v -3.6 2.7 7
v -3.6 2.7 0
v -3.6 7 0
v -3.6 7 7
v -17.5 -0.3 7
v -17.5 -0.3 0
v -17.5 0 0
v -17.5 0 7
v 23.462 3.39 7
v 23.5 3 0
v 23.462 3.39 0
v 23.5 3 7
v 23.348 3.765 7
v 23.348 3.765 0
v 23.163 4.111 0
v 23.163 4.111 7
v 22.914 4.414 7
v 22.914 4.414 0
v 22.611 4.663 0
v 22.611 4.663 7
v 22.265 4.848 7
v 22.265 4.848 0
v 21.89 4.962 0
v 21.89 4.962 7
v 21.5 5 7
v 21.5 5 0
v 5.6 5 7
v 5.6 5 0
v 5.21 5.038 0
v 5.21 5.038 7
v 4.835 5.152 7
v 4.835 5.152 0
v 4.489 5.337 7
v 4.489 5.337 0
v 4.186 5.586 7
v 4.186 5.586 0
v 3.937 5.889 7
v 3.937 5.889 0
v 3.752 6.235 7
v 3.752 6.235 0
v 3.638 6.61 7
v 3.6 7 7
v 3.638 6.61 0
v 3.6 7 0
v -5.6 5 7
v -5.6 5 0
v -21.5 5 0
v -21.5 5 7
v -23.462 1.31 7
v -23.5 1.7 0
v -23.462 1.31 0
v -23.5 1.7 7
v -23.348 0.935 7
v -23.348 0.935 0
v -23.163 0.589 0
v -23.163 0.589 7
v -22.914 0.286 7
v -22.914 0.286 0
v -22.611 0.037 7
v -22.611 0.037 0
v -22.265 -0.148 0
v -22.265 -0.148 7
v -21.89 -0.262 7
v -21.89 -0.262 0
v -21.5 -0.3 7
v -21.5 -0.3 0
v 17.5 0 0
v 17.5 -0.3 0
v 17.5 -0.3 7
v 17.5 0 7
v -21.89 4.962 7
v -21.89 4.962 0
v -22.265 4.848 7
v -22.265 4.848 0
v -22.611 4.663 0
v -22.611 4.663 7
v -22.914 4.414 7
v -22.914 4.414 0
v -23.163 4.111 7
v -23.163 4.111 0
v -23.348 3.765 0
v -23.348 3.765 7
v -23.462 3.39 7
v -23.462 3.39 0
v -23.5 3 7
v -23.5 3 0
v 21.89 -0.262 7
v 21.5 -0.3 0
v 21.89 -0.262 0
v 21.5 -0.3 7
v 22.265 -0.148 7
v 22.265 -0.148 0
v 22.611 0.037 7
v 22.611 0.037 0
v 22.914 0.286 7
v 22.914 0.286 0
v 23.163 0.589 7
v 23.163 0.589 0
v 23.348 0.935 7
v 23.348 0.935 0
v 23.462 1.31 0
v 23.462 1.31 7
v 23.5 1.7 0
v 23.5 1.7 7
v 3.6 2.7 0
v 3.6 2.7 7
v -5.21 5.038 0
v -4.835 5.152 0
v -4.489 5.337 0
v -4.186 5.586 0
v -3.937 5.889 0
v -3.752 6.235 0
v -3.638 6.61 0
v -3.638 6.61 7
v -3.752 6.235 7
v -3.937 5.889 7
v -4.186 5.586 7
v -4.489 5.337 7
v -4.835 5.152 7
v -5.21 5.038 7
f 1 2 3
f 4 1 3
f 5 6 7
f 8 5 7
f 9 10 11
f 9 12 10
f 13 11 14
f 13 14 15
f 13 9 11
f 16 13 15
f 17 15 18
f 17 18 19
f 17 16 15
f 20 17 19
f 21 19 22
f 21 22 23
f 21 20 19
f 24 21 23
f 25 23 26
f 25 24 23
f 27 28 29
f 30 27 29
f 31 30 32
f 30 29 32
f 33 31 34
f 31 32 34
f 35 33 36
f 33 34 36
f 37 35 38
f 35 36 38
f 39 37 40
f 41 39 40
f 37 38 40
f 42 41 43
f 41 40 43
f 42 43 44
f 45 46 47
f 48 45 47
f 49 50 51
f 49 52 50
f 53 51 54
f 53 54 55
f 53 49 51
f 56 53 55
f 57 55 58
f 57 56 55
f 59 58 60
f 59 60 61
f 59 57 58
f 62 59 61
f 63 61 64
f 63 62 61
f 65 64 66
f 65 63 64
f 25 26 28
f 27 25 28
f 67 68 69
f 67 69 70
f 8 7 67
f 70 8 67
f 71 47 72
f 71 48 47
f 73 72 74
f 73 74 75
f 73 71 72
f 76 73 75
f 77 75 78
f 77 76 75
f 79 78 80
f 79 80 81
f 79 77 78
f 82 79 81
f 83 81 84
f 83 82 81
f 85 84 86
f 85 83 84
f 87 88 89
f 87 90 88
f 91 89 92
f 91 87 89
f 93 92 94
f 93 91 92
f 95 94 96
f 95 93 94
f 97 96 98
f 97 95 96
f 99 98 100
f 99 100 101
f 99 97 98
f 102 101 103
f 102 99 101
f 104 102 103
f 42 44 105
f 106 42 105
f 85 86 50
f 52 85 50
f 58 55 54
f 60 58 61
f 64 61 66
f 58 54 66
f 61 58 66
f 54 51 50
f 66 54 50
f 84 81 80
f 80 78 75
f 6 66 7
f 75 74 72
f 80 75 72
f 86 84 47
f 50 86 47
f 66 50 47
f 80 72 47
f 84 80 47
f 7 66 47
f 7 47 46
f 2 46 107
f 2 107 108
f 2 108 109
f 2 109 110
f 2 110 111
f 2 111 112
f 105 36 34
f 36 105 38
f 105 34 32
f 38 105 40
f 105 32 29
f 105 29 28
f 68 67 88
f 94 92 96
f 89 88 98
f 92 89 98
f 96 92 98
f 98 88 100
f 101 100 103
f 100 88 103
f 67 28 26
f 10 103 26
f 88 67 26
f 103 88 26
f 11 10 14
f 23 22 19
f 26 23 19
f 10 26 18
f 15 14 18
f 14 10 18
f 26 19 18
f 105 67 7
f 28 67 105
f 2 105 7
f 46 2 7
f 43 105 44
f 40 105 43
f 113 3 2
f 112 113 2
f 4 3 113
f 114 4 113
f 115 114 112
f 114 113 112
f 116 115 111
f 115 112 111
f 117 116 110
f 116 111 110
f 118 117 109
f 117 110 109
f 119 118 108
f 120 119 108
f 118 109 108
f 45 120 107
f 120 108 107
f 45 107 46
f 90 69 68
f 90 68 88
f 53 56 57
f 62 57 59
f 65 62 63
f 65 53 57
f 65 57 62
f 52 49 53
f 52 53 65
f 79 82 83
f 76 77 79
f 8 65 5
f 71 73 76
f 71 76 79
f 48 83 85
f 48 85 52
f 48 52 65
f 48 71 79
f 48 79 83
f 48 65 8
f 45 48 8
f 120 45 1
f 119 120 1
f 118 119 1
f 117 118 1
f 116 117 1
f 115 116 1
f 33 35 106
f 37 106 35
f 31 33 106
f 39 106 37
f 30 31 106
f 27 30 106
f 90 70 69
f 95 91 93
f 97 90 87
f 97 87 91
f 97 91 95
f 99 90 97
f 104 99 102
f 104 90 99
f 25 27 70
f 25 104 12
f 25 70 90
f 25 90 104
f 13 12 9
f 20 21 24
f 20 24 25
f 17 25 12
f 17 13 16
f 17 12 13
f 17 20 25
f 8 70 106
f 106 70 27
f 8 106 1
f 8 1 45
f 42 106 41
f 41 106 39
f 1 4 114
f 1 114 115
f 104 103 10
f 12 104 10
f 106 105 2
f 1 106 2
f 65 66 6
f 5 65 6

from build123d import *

# Parameters (mm, degrees)
F0_W     = 6
F0_H     = 0.3
F1_DEPTH = 7
F2_R     = 2


with BuildPart() as f1:
    # F0 (on Top) → F1 (new body)
    with BuildSketch(Plane.XY):
        with BuildLine():
            ThreePointArc((-3.6, 7), (-4.185786, 5.585786), (-5.6, 5))
            Line((-5.6, 5), (-3.6, 5))
            Line((-3.6, 5), (-3.6, 7))
        make_face()
        with BuildLine():
            Line((3.6, 7), (3.6, 5))
            Line((3.6, 5), (5.6, 5))
            ThreePointArc((5.6, 5), (4.185786, 5.585786), (3.6, 7))
        make_face()
        with Locations((-20.5, -0.15)):
            Rectangle(F0_W, F0_H)
        Polygon((-5.6, 5), (-23.5, 5), (-23.5, 0), (-17.5, 0), (17.5, 0), (23.5, 0), (23.5, 5), (5.6, 5), (3.6, 5), (3.6, 2.7), (-3.6, 2.7), (-3.6, 5), align=None)
        with Locations((20.5, -0.15)):
            Rectangle(F0_W, F0_H)
    extrude(amount=F1_DEPTH)

    # F2
    f2_edges = [f1.edges().sort_by_distance(p)[0] for p in [
        (-23.5, 5, 3.5),
        (23.5, 5, 3.5),
        (-23.5, -0.3, 3.5),
        (23.5, -0.3, 3.5),
    ]]
    fillet(f2_edges, radius=F2_R)


solid = f1.part
